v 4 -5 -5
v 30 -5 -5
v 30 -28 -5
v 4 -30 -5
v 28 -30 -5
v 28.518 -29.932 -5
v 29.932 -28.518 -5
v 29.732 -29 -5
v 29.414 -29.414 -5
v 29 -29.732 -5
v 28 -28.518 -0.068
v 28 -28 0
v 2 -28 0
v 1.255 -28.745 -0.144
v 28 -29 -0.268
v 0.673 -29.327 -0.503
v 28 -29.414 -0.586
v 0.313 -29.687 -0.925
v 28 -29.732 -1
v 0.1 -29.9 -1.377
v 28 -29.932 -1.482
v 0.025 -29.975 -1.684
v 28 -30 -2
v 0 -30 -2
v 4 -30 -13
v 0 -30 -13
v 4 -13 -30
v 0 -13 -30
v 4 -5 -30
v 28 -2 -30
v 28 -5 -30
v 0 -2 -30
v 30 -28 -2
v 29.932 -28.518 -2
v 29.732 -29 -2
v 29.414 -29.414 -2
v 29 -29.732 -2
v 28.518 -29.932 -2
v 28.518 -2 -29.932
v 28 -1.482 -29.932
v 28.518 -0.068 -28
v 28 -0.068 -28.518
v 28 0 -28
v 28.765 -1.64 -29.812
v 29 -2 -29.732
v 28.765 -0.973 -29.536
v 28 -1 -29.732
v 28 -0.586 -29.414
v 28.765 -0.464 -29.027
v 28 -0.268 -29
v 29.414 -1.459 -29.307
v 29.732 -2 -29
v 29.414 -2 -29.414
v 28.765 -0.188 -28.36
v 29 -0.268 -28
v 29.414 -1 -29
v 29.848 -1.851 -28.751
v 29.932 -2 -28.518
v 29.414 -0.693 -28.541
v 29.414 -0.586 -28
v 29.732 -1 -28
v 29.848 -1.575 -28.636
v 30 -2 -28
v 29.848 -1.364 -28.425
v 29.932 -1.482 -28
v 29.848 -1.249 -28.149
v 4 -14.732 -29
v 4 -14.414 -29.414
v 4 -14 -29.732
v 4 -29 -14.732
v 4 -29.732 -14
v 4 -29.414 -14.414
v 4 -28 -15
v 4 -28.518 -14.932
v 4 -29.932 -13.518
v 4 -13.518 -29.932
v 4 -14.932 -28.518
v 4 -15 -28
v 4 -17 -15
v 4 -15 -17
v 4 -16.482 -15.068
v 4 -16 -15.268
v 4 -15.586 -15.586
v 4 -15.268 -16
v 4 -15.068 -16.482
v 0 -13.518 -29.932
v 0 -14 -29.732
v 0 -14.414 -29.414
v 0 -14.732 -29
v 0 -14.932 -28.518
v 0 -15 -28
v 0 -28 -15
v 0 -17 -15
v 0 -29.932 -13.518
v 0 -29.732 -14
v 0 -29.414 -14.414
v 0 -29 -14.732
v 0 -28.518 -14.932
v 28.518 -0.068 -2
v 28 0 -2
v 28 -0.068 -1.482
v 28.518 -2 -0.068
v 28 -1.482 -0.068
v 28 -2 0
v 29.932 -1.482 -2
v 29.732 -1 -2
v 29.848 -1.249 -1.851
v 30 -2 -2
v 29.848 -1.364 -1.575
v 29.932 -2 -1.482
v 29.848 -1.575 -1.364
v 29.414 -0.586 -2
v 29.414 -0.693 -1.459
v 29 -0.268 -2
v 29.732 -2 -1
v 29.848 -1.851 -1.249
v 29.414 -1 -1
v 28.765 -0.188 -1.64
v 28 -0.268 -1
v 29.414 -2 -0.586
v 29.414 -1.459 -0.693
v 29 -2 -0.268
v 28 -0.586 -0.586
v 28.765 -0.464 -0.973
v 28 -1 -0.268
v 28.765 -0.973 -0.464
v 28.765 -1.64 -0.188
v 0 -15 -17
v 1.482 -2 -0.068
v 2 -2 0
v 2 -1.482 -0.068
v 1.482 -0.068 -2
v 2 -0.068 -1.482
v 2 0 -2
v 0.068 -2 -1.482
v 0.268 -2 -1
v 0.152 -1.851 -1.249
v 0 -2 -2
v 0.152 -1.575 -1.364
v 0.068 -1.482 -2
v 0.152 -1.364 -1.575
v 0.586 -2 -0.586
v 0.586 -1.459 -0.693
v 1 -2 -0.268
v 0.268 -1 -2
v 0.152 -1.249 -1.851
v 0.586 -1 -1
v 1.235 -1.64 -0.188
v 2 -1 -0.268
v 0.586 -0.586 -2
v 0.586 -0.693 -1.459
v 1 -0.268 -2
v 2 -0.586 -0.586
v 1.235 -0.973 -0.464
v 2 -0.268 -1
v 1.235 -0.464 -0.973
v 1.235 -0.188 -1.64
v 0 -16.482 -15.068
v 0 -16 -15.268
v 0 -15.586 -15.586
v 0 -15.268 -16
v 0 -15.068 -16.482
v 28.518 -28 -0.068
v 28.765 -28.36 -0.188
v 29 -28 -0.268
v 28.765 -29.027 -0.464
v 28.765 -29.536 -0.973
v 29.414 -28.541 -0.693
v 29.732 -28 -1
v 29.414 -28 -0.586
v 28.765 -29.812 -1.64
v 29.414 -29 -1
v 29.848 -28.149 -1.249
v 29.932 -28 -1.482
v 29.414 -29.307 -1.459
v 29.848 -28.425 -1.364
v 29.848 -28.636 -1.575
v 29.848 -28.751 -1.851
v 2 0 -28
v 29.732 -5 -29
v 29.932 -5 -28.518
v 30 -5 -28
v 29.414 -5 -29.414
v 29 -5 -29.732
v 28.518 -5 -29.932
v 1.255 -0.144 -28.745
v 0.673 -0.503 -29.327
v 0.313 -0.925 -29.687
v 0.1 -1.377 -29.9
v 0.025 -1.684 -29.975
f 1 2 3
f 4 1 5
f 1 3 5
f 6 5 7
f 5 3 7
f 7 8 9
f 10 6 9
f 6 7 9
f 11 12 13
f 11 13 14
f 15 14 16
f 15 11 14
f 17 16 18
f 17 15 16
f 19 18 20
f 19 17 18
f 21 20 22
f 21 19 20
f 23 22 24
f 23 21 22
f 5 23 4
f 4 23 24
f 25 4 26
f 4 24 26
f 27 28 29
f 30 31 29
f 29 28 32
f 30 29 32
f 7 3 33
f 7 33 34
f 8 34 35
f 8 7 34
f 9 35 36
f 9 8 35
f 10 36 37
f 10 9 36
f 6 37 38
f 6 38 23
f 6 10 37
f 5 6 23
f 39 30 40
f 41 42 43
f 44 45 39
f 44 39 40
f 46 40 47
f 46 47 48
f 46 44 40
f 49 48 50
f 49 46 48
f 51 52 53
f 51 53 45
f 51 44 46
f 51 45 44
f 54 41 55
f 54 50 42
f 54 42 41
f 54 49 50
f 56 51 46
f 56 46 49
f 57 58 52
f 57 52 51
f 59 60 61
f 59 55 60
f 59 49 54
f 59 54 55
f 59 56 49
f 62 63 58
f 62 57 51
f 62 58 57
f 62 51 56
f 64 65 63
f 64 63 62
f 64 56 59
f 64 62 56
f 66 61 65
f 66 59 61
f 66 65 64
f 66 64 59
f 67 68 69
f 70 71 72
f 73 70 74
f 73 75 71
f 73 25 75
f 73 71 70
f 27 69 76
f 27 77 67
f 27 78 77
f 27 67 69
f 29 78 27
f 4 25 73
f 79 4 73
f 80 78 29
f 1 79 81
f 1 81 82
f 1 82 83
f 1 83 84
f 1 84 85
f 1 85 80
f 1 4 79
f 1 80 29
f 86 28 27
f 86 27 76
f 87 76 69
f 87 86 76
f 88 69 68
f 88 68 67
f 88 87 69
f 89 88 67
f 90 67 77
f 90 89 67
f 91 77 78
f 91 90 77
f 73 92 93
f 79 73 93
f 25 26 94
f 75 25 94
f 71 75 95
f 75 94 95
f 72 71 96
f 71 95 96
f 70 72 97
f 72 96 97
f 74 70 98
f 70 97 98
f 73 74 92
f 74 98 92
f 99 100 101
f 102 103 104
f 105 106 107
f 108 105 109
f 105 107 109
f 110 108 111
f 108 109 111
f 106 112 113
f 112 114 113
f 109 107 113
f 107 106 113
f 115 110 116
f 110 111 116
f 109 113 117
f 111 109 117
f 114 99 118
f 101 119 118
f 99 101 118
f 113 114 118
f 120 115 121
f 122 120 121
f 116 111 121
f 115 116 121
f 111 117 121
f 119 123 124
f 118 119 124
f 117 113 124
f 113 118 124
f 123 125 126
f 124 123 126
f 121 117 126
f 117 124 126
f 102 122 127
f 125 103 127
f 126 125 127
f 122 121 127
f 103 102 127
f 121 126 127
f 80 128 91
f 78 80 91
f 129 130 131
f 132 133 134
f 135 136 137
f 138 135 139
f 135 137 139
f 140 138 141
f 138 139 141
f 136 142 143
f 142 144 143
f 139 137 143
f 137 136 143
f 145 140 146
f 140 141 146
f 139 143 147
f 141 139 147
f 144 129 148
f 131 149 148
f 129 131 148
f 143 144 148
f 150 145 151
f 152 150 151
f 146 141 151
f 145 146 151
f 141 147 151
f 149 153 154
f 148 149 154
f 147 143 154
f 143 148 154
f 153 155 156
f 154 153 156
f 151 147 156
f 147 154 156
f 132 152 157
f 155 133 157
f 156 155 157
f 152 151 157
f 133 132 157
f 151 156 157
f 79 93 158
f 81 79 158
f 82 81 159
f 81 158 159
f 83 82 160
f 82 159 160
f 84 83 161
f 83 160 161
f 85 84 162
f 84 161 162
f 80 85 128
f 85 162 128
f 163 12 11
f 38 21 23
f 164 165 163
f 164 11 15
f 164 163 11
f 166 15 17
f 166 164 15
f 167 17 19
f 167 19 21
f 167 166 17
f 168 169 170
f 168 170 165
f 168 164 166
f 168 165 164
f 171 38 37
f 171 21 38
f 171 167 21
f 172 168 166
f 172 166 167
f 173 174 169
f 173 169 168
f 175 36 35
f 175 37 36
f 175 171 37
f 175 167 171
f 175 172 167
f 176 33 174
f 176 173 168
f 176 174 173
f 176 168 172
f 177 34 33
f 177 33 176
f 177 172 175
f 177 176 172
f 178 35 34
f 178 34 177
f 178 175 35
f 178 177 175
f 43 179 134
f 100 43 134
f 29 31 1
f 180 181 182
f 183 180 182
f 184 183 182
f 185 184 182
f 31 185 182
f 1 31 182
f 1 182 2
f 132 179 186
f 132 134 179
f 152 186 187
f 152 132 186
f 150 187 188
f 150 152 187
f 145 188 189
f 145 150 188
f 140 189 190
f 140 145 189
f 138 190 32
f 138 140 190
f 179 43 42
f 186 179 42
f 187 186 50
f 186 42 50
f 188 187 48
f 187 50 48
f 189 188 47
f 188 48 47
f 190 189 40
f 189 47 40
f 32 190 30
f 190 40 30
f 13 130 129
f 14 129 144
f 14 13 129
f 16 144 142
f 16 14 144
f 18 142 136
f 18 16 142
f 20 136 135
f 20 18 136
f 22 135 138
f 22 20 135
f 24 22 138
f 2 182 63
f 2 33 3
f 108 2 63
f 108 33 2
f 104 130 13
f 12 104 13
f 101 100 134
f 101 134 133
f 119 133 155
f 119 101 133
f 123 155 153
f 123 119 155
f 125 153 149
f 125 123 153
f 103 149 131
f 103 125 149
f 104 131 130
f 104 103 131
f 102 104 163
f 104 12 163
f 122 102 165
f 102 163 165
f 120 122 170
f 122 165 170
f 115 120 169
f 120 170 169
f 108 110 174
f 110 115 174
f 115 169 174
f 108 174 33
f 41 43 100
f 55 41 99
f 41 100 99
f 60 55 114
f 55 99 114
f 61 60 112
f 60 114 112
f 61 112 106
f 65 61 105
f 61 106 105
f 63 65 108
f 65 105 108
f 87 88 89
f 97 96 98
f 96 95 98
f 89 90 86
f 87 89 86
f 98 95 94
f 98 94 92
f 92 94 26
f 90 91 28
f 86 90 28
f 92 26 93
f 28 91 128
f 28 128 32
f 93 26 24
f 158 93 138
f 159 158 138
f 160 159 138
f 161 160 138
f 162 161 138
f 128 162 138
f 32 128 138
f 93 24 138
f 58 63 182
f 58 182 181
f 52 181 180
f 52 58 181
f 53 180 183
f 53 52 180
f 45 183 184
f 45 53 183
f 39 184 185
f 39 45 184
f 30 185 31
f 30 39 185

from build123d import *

# Parameters (mm, degrees)
F1_DEPTH     = 30
F3_DEPTH     = 26
F4_R         = 2
F5_T1_DEPTH  = 4
F5_T3_DEPTH  = 14
F5_T5_DEPTH  = 8
F5_T7_DEPTH  = 8
F5_S11_W     = 2
F5_S11_H     = 2
F5_T12_DEPTH = 2
F5_S17_W     = 2
F5_S17_H     = 2
F5_T18_DEPTH = 2


# Not quite as in the source:
# - a fillet or chamfer that OpenCascade refuses, or shapes differently, is made with other operations: its cross-section is extruded or revolved along the edge and cut away or added


with BuildPart() as f1:
    # F0 (on Right) → F1 (new body)
    with BuildSketch(Plane.YZ):
        Polygon((0, -30), (0, 0), (-30, 0), (-30, -15), (-15, -15), (-15, -30), align=None)
    extrude(amount=F1_DEPTH)

    # F2 (on face) → F3 (cut)
    with BuildSketch(Plane.YZ.offset(30)):
        Polygon((-30, -5), (-30, -15), (-15, -15), (-15, -30), (-5, -30), (-5, -5), align=None)
    extrude(amount=-F3_DEPTH, mode=Mode.SUBTRACT)

    # F4
    f4_edges = [f1.edges().sort_by_distance(p)[0] for p in [
        (15, -30, 0),
        (15, 0, 0),
        (0, -15, 0),
        (0, 0, -15),
        (15, 0, -30),
        (30, 0, -15),
        (30, -15, 0),
    ]]
    fillet(f4_edges, radius=F4_R)

    # F5: fillet of radius 2 on 5 edges, made by hand

    # F5_s2 → F5_t1 (join)
    with BuildSketch(Plane.YZ):
        with BuildLine():
            ThreePointArc((-17, -15), (-15.5857864376, -15.5857864376), (-15, -17))
            Line((-15, -17), (-15, -15))
            Line((-15, -15), (-17, -15))
        make_face()
    extrude(amount=F5_T1_DEPTH)

    # F5_s4 → F5_t3 (cut)
    with BuildSketch(Plane.YZ.offset(-5)):
        with BuildLine():
            ThreePointArc((-13, -30), (-14.4142135624, -29.4142135624), (-15, -28))
            Line((-15, -28), (-15, -30))
            Line((-15, -30), (-13, -30))
        make_face()
        with BuildLine():
            ThreePointArc((-30, -13), (-29.4142135624, -14.4142135624), (-28, -15))
            Line((-28, -15), (-30, -15))
            Line((-30, -15), (-30, -13))
        make_face()
    extrude(amount=F5_T3_DEPTH, mode=Mode.SUBTRACT)

    # F5_s6 → F5_t5 (cut)
    with BuildSketch(Plane.XZ.offset(2)):
        with BuildLine():
            ThreePointArc((30, -28), (29.4142135624, -29.4142135624), (28, -30))
            Line((28, -30), (30, -30))
            Line((30, -30), (30, -28))
        make_face()
    extrude(amount=F5_T5_DEPTH, mode=Mode.SUBTRACT)

    # F5_s8 → F5_t7 (cut)
    with BuildSketch(Plane.XY.offset(-10)):
        with BuildLine():
            ThreePointArc((30, -28), (29.4142135624, -29.4142135624), (28, -30))
            Line((28, -30), (30, -30))
            Line((30, -30), (30, -28))
        make_face()
    extrude(amount=F5_T7_DEPTH, mode=Mode.SUBTRACT)


with BuildPart() as f5_tool10:
    # F5_s11 → F5_t12 (new body)
    with BuildSketch(Plane.YZ.offset(28)):
        with Locations((-29, -1)):
            Rectangle(F5_S11_W, F5_S11_H)
    extrude(amount=F5_T12_DEPTH)

    # F5_s13 → F5_t14 (revolve, cut)
    with BuildSketch(Plane(origin=(28, -28, -2), x_dir=(0, 0.7071067812, -0.7071067812), z_dir=(0, -0.7071067812, -0.7071067812))):
        with BuildLine():
            ThreePointArc((0, -2), (2, 0), (0, 2))
            Line((0, 2), (0, -2))
        make_face()
    revolve(axis=Axis((28, -28, -2), (1, 0, 0)), mode=Mode.SUBTRACT)


with BuildPart() as f1_1:
    add(f1.part)

    # F5_t9: cut F5_tool10
    add(f5_tool10.part, mode=Mode.SUBTRACT)


with BuildPart() as f5_tool16:
    # F5_s17 → F5_t18 (new body)
    with BuildSketch(Plane.YZ.offset(28)):
        with Locations((-1, -29)):
            Rectangle(F5_S17_W, F5_S17_H)
    extrude(amount=F5_T18_DEPTH)

    # F5_s19 → F5_t20 (revolve, cut)
    with BuildSketch(Plane(origin=(28, -2, -28), x_dir=(0, -0.7071067812, 0.7071067812), z_dir=(0, 0.7071067812, 0.7071067812))):
        with BuildLine():
            ThreePointArc((0, -2), (2, 0), (0, 2))
            Line((0, 2), (0, -2))
        make_face()
    revolve(axis=Axis((28, -2, -28), (1, 0, 0)), mode=Mode.SUBTRACT)


with BuildPart() as f1_2:
    add(f1_1.part)

    # F5_t15: cut F5_tool16
    add(f5_tool16.part, mode=Mode.SUBTRACT)


solid = f1_2.part
